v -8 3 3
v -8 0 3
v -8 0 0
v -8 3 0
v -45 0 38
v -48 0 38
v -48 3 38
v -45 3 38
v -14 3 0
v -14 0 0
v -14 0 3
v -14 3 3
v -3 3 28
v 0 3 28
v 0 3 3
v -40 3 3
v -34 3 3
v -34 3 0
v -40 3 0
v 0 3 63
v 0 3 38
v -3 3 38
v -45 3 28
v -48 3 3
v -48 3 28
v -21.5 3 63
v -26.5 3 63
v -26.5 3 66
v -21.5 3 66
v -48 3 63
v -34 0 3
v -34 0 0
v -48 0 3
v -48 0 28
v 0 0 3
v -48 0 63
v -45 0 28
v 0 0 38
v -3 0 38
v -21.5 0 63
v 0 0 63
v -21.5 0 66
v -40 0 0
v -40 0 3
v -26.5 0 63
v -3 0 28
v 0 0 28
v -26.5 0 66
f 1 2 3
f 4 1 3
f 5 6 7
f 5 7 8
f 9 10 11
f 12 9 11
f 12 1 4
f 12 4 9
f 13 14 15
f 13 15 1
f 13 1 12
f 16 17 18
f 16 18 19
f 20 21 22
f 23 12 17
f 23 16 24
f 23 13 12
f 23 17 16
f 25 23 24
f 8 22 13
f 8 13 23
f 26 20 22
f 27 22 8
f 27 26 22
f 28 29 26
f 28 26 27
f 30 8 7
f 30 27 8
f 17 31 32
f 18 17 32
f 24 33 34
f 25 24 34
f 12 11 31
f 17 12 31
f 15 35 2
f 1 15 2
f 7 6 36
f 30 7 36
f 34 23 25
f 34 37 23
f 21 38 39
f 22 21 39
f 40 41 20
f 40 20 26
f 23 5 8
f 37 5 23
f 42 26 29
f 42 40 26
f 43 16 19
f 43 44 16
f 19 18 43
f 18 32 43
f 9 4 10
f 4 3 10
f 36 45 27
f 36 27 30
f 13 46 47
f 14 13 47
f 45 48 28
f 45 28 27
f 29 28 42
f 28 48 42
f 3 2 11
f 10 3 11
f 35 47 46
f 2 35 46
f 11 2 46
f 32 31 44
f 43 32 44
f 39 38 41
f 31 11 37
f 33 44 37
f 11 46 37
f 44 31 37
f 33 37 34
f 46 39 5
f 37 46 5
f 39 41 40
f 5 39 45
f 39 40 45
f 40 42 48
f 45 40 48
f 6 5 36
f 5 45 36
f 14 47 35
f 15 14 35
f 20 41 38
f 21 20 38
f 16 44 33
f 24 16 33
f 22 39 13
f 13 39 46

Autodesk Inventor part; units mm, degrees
ref_plane "YZ Plane" through (0, 0, 0) normal (1, 0, 0) x (0, 1, 0)
ref_plane "XZ Plane" through (0, 0, 0) normal (0, 1, 0) x (-1, 0, 0)
ref_plane "XY Plane" through (0, 0, 0) normal (0, 0, 1) x (1, 0, 0)
sketch "Sketch1" plane through (0, 0, 0) normal (0, 1, 0) x (-1, 0, 0)
  line L0 (26.5, 66) -> (21.5, 66)
  line L1 (0, 63) -> (21.5, 63)
  line L2 (21.5, 63) -> (21.5, 66)
  line L3 (26.5, 66) -> (26.5, 63)
  line L4 (26.5, 63) -> (48, 63)
  line L5 (14, 0) -> (14, 3)
  line L6 (14, 3) -> (34, 3)
  line L7 (34, 3) -> (34, 0)
  line L8 (8, 0) -> (14, 0)
  line L9 (34, 0) -> (40, 0)
  line L10 (0, 63) -> (0, 38)
  line L11 (0, 28) -> (0, 3)
  line L12 (48, 3) -> (48, 28)
  line L13 (48, 38) -> (48, 63)
  line L14 (0, 38) -> (3, 38)
  line L15 (3, 38) -> (3, 28)
  line L16 (3, 28) -> (0, 28)
  line L17 (48, 38) -> (45, 38)
  line L18 (45, 38) -> (45, 28)
  line L19 (45, 28) -> (48, 28)
  line L20 (0, 3) -> (8, 3)
  line L21 (8, 3) -> (8, 0)
  line L22 (40, 3) -> (40, 0)
  line L23 (40, 3) -> (48, 3)
  point P0 (0, 0)
  dimension "d0" = 48
  dimension "d3" = 5
  dimension "d5" = 3
  dimension "d6" = 3
  dimension "d8" = 3
  dimension "d9" = 3
  dimension "d16" = 66
  dimension "d23" = 3
  dimension "d24" = 10
  dimension "d25" = 10
  dimension "d26" = 3
  dimension "d27" = 28
  dimension "d29" = 3
  dimension "d30" = 3
  dimension "d34" = 21.5
  dimension "d35" = 8
  dimension "d36" = 8
  dimension "d37" = 3
  dimension "d38" = 3
  dimension "d40" = 6
  dimension "d41" = 6
  dimension "d42" = 25
  dimension "d43" = 25
extrude "Extrusion1" add sketch "Sketch1" along normal blind 3
properties part number "Bottom"
